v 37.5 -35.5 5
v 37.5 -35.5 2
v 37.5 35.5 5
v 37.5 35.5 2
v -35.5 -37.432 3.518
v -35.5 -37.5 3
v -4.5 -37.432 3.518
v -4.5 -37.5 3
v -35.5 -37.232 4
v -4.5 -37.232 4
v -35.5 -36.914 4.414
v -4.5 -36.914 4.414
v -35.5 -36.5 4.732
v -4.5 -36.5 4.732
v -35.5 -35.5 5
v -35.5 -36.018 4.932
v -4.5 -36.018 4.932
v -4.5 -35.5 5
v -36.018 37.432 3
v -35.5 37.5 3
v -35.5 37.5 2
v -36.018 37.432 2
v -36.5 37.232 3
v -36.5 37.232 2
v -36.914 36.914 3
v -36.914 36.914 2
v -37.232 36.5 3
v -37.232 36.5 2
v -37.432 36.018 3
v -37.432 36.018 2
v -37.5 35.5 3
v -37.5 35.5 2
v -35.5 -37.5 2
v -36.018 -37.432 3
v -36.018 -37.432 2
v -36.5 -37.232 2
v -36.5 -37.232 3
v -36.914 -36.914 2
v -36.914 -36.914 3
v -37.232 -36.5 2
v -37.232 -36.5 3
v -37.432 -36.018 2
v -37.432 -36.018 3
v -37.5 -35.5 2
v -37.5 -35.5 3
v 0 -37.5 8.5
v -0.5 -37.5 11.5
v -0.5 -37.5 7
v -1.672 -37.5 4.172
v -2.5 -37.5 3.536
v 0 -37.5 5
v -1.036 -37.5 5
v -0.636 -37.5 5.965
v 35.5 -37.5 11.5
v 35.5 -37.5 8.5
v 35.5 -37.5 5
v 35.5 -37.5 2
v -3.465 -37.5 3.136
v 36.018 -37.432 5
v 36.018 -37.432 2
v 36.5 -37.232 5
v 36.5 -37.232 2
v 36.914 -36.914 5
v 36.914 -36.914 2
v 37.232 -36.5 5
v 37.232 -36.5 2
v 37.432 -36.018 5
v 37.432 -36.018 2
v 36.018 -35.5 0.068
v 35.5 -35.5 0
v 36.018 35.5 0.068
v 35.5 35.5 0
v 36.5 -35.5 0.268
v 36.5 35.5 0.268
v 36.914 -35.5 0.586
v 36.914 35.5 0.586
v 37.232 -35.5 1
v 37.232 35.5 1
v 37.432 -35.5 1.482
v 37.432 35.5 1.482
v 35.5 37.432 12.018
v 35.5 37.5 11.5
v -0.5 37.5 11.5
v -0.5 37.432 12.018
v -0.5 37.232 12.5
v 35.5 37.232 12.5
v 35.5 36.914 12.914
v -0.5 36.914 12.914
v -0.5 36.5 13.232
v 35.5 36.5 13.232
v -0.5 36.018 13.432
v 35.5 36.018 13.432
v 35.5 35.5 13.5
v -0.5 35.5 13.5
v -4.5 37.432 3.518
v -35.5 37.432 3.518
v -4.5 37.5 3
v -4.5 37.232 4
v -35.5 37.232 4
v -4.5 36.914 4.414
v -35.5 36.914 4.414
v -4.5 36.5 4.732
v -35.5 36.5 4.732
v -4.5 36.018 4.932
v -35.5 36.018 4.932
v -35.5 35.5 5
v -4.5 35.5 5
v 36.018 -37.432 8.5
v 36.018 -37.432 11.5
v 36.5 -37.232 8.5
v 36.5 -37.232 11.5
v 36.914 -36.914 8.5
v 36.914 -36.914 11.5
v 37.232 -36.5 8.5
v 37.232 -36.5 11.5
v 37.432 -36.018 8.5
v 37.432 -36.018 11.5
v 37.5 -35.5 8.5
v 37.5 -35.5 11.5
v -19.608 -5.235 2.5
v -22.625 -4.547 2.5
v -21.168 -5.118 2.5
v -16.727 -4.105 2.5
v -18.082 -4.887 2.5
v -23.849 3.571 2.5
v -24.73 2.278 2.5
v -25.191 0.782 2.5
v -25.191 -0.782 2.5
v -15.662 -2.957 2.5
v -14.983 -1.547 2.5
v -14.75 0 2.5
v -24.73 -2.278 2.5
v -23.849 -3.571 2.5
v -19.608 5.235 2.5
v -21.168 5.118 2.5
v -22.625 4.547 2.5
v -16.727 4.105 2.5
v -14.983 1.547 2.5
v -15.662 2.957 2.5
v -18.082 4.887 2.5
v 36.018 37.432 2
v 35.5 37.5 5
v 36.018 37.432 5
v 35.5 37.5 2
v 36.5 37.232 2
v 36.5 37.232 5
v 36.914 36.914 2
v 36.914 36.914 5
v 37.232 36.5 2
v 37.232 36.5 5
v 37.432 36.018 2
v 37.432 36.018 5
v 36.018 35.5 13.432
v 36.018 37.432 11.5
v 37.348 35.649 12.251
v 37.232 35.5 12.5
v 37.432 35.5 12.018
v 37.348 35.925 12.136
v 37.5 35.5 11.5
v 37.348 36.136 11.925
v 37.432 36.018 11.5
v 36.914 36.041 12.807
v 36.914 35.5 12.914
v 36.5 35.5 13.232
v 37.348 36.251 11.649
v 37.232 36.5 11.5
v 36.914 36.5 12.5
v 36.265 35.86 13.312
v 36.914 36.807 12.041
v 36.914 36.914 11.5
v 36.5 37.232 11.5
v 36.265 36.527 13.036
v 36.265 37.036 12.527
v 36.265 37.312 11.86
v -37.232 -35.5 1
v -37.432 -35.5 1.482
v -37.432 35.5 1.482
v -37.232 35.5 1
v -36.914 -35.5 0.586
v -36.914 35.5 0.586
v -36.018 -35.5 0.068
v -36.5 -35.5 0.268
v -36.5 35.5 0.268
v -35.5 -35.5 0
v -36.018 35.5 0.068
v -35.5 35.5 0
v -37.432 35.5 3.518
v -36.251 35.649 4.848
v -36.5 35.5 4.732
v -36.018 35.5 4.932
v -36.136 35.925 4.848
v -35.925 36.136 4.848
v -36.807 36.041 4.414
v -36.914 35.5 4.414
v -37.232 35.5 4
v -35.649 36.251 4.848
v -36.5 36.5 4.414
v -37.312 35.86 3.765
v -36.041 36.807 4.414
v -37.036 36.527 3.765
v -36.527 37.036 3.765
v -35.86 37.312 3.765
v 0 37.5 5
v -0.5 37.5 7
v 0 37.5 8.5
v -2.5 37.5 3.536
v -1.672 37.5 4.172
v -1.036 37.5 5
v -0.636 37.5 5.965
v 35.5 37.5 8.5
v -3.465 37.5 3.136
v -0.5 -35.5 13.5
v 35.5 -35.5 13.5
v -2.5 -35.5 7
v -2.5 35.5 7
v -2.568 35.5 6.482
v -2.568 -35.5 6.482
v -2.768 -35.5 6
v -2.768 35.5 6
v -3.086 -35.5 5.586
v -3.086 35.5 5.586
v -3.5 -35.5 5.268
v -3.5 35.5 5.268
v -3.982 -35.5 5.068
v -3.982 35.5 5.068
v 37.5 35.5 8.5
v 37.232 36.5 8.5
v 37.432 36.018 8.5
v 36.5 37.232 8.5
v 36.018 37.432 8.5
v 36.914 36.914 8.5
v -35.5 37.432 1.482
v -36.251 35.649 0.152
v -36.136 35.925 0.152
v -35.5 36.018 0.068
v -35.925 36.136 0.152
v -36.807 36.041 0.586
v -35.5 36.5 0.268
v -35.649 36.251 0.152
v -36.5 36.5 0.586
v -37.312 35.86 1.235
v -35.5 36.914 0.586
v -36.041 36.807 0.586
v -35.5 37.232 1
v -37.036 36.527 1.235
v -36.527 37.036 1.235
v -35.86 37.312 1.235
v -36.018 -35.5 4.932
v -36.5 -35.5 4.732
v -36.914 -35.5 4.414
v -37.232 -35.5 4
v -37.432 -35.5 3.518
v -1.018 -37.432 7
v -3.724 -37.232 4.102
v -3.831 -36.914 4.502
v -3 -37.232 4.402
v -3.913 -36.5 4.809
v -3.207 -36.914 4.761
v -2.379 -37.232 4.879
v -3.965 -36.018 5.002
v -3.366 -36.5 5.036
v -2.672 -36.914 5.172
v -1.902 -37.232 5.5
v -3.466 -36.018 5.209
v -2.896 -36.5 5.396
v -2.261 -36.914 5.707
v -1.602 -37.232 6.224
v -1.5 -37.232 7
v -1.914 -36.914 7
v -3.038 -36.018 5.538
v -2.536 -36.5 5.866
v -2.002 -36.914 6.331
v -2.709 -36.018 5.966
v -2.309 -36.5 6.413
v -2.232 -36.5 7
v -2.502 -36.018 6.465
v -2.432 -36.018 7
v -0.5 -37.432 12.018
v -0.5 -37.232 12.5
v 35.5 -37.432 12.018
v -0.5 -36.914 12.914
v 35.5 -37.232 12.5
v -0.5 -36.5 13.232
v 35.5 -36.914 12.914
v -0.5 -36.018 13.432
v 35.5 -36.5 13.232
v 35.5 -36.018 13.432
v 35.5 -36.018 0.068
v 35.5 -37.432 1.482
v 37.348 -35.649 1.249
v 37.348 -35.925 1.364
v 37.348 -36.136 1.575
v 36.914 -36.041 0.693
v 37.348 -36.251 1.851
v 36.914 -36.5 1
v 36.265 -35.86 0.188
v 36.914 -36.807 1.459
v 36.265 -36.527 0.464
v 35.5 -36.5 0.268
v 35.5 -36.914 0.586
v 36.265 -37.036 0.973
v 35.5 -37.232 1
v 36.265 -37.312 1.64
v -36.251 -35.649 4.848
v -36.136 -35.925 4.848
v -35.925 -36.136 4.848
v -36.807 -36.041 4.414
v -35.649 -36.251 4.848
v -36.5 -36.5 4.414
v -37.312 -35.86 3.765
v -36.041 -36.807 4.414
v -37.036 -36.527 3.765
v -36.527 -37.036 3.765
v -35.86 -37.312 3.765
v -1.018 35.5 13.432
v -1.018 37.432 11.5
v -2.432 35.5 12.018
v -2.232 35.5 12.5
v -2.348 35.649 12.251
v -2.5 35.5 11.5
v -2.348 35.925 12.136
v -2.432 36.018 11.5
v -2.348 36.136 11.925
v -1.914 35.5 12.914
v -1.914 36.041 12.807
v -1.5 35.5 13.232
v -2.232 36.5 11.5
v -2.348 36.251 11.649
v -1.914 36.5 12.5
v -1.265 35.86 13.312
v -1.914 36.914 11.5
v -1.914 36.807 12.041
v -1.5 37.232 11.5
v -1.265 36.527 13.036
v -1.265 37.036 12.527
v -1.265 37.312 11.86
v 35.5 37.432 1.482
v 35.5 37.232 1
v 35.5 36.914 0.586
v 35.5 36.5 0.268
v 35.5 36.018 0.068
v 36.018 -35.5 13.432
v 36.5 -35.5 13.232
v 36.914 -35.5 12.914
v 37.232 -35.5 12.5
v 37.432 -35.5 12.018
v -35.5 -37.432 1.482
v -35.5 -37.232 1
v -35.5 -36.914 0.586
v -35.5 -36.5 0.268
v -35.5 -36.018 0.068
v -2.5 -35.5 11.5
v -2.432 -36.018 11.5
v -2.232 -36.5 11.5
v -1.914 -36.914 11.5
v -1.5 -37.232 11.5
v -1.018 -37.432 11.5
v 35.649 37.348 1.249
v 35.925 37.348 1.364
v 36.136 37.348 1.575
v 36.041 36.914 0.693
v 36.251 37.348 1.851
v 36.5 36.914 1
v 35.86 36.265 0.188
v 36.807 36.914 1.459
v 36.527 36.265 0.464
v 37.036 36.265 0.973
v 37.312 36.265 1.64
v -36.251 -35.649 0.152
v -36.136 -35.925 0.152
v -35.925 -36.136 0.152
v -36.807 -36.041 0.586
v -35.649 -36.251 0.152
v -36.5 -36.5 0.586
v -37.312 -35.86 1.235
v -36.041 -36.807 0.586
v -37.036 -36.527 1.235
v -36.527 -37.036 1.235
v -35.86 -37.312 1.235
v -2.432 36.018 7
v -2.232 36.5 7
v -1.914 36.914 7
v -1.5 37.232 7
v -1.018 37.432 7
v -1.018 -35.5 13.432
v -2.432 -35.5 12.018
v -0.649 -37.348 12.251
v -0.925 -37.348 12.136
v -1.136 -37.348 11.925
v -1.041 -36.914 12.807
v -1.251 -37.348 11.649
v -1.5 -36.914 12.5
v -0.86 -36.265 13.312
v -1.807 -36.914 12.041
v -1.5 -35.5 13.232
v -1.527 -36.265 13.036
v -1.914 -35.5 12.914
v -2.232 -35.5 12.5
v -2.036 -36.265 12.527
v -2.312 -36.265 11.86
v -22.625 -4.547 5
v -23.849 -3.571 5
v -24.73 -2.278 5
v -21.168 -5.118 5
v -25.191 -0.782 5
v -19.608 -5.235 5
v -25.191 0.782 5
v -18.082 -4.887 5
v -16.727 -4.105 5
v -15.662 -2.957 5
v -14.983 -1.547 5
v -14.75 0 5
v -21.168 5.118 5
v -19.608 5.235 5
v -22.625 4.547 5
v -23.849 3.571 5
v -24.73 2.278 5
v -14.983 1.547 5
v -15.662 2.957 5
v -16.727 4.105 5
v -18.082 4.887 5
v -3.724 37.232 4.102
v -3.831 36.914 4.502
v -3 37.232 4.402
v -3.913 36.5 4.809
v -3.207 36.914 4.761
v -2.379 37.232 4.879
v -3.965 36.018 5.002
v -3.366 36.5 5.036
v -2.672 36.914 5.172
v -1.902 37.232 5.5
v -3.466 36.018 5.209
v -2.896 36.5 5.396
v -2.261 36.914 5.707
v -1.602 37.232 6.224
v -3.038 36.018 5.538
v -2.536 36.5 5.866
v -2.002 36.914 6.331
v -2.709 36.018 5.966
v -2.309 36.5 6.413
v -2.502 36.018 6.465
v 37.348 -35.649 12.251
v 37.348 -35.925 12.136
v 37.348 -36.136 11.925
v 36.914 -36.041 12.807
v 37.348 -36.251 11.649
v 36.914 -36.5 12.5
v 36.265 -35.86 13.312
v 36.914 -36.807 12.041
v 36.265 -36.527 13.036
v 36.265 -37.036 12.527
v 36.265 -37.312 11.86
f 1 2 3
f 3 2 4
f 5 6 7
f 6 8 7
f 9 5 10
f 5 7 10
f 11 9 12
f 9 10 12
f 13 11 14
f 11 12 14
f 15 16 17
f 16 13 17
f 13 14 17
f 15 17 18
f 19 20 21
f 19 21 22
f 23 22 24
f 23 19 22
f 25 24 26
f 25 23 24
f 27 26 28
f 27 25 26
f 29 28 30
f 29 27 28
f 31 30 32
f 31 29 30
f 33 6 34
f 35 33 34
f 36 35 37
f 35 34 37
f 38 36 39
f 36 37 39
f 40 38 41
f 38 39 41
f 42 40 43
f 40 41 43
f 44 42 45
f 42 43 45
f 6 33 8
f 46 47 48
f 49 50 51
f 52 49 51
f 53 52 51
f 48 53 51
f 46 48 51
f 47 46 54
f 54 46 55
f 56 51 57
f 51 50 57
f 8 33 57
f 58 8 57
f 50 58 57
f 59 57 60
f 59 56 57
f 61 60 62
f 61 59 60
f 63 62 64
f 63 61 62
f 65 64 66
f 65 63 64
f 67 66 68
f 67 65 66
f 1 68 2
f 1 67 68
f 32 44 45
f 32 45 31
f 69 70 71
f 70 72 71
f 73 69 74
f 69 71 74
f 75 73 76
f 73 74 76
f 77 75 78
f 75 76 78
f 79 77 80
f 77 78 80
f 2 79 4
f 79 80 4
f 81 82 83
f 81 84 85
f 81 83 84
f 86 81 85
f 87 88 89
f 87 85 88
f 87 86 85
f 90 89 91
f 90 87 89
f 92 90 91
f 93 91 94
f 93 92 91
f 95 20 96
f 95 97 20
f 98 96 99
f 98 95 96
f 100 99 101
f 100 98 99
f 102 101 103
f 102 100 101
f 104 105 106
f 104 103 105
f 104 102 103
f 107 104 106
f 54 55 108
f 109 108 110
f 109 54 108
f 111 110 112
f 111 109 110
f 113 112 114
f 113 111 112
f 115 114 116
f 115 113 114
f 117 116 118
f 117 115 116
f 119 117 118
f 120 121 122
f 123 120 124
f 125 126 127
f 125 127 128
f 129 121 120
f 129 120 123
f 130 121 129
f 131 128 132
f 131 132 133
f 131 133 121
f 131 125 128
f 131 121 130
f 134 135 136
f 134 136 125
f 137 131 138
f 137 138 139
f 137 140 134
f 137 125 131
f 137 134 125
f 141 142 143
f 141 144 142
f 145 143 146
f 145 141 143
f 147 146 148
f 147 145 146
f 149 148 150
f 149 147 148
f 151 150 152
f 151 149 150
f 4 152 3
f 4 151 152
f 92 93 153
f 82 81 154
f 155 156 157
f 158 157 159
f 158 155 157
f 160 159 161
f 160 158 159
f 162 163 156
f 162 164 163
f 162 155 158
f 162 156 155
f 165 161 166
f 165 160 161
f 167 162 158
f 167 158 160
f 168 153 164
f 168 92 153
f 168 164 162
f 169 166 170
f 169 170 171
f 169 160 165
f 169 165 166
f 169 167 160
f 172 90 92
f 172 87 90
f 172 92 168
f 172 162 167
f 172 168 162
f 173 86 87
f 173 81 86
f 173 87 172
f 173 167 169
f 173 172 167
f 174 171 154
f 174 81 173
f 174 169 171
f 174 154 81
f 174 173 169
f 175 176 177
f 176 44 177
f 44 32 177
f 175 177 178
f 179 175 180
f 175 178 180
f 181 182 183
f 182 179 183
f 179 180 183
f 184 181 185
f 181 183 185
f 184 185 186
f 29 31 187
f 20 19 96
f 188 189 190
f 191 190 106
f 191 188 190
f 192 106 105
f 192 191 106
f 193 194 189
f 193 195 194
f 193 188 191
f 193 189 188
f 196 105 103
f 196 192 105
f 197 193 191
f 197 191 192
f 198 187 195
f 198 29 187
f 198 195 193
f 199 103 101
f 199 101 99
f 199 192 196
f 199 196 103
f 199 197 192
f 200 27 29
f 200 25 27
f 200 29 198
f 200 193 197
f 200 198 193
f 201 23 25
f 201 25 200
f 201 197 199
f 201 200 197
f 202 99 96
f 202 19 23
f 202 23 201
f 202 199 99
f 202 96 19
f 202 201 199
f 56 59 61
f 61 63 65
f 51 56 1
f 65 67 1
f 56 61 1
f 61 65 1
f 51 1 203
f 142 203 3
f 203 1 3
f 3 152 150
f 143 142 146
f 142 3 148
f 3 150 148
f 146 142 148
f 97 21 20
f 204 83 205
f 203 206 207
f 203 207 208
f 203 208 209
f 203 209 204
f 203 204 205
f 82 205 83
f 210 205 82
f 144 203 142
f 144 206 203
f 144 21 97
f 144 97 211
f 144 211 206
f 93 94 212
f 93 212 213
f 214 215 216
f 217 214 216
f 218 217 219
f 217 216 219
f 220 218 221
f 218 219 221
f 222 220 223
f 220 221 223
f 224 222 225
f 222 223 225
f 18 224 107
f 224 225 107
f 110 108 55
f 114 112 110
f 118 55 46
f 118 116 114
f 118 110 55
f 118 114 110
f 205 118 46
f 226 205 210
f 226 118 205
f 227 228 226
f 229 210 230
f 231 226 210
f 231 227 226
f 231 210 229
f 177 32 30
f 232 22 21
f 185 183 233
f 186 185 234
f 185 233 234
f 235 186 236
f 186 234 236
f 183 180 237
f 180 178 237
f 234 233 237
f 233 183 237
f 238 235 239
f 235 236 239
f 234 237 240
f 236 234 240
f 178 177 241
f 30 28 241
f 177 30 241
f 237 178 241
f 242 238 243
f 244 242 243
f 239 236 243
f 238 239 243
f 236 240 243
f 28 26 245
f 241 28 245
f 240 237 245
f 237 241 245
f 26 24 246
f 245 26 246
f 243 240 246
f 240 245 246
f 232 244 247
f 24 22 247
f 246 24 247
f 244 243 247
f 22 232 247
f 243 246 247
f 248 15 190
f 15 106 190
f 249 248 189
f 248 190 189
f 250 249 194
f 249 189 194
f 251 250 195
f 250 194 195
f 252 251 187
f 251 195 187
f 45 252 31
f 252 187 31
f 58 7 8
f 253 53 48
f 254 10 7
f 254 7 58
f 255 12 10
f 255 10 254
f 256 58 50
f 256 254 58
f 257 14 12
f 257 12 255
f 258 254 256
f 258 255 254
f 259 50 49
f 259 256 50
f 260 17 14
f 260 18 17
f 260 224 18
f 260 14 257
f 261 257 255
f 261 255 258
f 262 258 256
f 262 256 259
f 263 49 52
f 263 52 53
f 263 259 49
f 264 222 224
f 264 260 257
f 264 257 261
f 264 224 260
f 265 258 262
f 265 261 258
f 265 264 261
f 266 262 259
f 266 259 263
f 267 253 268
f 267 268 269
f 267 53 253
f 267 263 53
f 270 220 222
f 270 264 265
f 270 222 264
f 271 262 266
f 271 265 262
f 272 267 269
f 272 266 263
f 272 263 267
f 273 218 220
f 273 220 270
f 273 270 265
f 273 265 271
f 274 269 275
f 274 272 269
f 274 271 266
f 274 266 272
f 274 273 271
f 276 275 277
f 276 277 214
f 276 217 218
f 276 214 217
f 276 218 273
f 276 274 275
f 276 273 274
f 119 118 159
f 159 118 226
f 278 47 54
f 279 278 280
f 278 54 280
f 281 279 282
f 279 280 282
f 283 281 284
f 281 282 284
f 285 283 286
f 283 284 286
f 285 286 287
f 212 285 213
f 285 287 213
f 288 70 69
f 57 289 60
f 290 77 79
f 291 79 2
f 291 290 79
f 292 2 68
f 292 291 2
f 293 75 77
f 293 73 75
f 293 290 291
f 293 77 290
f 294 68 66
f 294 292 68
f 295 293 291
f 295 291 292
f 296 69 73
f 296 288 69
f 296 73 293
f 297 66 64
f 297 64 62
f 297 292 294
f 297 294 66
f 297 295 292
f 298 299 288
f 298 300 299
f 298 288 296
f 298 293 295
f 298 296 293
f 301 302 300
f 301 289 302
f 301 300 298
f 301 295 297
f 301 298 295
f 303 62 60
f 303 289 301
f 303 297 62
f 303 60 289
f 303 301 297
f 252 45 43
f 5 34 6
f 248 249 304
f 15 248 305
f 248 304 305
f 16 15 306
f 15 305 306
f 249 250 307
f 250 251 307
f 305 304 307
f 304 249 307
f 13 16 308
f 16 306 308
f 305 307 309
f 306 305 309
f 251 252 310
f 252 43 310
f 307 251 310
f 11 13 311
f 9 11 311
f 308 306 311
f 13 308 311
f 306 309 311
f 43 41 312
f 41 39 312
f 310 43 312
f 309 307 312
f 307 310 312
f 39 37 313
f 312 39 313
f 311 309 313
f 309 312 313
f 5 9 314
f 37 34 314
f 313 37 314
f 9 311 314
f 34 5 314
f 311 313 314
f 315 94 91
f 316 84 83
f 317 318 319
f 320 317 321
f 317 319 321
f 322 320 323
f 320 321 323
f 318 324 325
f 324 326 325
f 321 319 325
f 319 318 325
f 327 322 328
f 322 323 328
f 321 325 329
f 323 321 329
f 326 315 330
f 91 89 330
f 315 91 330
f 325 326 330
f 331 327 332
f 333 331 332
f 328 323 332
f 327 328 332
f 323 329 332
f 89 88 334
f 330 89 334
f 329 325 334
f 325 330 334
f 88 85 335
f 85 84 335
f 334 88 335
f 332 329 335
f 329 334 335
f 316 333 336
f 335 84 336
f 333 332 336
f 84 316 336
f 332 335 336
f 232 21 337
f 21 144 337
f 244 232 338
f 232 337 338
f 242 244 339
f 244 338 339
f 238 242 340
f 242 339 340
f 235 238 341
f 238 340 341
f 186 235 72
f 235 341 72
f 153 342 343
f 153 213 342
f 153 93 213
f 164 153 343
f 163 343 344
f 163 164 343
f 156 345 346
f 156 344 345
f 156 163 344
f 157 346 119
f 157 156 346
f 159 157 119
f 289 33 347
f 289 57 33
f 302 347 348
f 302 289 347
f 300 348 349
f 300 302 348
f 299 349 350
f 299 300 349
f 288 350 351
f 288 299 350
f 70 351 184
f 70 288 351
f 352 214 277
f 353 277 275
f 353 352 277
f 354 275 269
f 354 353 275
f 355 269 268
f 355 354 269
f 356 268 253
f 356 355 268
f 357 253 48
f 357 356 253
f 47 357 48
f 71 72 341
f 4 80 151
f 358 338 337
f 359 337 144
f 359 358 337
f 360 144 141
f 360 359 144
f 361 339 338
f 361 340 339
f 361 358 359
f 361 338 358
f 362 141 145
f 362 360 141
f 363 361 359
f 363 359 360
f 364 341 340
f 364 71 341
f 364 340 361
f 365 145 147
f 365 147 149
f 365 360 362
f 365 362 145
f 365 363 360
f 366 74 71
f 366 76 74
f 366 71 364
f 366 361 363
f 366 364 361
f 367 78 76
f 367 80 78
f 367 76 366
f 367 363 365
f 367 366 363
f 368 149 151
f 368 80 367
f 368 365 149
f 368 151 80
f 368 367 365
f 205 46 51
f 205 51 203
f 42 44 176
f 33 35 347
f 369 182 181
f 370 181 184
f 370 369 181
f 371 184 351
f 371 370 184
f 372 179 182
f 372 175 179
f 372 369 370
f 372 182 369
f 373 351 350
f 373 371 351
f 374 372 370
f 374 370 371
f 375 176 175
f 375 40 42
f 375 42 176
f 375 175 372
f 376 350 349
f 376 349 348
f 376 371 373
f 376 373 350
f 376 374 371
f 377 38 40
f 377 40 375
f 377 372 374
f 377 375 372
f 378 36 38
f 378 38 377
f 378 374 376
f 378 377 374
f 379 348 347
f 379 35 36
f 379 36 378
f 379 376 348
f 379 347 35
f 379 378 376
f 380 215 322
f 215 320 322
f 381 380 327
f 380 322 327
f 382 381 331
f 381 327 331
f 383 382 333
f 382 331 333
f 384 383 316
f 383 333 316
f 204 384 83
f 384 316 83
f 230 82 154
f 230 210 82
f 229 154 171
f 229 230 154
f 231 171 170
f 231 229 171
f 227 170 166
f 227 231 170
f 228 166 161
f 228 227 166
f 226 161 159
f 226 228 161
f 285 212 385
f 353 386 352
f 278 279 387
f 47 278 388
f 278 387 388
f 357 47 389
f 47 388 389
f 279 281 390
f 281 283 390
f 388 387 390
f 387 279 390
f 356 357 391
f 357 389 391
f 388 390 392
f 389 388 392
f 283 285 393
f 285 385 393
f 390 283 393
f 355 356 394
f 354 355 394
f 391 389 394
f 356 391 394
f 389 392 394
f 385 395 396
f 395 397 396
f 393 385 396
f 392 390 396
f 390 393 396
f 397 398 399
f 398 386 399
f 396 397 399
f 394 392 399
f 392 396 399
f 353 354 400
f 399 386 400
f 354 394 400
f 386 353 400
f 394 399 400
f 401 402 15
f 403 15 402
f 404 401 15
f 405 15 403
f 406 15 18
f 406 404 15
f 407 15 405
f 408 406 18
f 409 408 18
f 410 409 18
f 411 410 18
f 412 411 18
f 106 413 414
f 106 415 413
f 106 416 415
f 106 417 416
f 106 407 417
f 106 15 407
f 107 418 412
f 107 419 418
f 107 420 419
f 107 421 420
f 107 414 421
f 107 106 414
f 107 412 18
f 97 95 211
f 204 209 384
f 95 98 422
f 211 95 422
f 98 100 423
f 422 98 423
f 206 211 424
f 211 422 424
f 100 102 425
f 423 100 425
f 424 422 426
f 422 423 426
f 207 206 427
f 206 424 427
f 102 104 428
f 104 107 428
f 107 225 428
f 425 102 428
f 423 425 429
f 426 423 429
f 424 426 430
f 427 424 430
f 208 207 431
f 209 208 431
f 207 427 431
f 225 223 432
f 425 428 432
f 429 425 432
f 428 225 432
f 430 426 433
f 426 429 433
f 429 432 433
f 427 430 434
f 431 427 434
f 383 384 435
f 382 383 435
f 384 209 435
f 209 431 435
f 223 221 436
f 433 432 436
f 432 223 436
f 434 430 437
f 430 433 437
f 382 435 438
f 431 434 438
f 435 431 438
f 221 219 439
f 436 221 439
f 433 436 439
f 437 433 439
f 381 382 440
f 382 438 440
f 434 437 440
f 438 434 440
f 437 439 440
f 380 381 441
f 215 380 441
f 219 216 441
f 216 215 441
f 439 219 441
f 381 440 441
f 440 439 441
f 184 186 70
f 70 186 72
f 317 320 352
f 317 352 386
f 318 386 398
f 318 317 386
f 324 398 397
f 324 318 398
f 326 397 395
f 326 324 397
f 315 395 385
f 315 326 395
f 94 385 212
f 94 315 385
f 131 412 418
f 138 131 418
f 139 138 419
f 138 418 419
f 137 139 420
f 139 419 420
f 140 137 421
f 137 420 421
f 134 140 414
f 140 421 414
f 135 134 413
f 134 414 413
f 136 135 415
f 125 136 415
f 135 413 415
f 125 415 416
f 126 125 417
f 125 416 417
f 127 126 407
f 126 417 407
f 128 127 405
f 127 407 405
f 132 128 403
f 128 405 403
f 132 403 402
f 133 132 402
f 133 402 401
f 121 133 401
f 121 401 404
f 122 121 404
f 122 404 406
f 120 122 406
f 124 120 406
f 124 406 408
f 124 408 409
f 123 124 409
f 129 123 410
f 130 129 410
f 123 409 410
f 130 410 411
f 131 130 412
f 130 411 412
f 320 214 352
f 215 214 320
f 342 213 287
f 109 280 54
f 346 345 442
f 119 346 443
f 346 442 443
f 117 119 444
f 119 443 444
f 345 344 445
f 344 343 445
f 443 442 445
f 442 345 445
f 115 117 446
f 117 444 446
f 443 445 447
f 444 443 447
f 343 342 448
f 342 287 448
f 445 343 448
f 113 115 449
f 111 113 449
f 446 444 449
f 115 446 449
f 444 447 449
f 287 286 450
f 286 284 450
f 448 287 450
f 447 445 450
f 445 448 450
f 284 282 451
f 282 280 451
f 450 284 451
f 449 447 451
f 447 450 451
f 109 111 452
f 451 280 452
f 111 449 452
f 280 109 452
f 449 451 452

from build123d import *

# Parameters (mm, degrees)
F0_W     = 75
F0_H     = 75
F1_DEPTH = 5
F2_W     = 40
F2_H     = 75
F3_DEPTH = 8.5
F4_W     = 75
F4_H     = 3.5
F5_DEPTH = 37.5
F6_R     = 5.25
F7_DEPTH = 2.5
F8_R     = 2


with BuildPart() as f1:
    # F0 (on Top) → F1 (new body)
    with BuildSketch(Plane.XY):
        Rectangle(F0_W, F0_H)
    extrude(amount=F1_DEPTH)

    # F2 (on face) → F3 (join)
    with BuildSketch(Plane.XY.offset(5)):
        with Locations((17.5, 0)):
            Rectangle(F2_W, F2_H)
    extrude(amount=F3_DEPTH)

    # F4 (on face) → F5 (cut, through all)
    with BuildSketch(Plane.YZ.offset(37.5)):
        with Locations((0, 6.75)):
            Rectangle(F4_W, F4_H)
    extrude(amount=-F5_DEPTH, mode=Mode.SUBTRACT)

    # F6 (on face) → F7 (cut)
    with BuildSketch(Plane.XY.offset(5)):
        with Locations((-20, 0)):
            Circle(F6_R)
    extrude(amount=-F7_DEPTH, mode=Mode.SUBTRACT)

    # F8
    f8_edges = [f1.edges().sort_by_distance(p)[0] for p in [
        (17.5, 37.5, 13.5),
        (-2.5, 0, 13.5),
        (17.5, -37.5, 13.5),
        (37.5, 0, 13.5),
        (-2.5, 37.5, 9.25),
        (-2.5, -37.5, 9.25),
        (-2.5, 0, 5),
        (-37.5, 37.5, 2.5),
        (-37.5, -37.5, 2.5),
        (-37.5, 0, 0),
        (-37.5, 0, 5),
        (0, -37.5, 0),
        (37.5, 0, 0),
        (0, 37.5, 0),
        (37.5, -37.5, 11),
        (37.5, -37.5, 2.5),
        (37.5, 37.5, 11),
        (37.5, 37.5, 2.5),
        (-20, -37.5, 5),
        (-20, 37.5, 5),
    ]]
    fillet(f8_edges, radius=F8_R)


solid = f1.part
